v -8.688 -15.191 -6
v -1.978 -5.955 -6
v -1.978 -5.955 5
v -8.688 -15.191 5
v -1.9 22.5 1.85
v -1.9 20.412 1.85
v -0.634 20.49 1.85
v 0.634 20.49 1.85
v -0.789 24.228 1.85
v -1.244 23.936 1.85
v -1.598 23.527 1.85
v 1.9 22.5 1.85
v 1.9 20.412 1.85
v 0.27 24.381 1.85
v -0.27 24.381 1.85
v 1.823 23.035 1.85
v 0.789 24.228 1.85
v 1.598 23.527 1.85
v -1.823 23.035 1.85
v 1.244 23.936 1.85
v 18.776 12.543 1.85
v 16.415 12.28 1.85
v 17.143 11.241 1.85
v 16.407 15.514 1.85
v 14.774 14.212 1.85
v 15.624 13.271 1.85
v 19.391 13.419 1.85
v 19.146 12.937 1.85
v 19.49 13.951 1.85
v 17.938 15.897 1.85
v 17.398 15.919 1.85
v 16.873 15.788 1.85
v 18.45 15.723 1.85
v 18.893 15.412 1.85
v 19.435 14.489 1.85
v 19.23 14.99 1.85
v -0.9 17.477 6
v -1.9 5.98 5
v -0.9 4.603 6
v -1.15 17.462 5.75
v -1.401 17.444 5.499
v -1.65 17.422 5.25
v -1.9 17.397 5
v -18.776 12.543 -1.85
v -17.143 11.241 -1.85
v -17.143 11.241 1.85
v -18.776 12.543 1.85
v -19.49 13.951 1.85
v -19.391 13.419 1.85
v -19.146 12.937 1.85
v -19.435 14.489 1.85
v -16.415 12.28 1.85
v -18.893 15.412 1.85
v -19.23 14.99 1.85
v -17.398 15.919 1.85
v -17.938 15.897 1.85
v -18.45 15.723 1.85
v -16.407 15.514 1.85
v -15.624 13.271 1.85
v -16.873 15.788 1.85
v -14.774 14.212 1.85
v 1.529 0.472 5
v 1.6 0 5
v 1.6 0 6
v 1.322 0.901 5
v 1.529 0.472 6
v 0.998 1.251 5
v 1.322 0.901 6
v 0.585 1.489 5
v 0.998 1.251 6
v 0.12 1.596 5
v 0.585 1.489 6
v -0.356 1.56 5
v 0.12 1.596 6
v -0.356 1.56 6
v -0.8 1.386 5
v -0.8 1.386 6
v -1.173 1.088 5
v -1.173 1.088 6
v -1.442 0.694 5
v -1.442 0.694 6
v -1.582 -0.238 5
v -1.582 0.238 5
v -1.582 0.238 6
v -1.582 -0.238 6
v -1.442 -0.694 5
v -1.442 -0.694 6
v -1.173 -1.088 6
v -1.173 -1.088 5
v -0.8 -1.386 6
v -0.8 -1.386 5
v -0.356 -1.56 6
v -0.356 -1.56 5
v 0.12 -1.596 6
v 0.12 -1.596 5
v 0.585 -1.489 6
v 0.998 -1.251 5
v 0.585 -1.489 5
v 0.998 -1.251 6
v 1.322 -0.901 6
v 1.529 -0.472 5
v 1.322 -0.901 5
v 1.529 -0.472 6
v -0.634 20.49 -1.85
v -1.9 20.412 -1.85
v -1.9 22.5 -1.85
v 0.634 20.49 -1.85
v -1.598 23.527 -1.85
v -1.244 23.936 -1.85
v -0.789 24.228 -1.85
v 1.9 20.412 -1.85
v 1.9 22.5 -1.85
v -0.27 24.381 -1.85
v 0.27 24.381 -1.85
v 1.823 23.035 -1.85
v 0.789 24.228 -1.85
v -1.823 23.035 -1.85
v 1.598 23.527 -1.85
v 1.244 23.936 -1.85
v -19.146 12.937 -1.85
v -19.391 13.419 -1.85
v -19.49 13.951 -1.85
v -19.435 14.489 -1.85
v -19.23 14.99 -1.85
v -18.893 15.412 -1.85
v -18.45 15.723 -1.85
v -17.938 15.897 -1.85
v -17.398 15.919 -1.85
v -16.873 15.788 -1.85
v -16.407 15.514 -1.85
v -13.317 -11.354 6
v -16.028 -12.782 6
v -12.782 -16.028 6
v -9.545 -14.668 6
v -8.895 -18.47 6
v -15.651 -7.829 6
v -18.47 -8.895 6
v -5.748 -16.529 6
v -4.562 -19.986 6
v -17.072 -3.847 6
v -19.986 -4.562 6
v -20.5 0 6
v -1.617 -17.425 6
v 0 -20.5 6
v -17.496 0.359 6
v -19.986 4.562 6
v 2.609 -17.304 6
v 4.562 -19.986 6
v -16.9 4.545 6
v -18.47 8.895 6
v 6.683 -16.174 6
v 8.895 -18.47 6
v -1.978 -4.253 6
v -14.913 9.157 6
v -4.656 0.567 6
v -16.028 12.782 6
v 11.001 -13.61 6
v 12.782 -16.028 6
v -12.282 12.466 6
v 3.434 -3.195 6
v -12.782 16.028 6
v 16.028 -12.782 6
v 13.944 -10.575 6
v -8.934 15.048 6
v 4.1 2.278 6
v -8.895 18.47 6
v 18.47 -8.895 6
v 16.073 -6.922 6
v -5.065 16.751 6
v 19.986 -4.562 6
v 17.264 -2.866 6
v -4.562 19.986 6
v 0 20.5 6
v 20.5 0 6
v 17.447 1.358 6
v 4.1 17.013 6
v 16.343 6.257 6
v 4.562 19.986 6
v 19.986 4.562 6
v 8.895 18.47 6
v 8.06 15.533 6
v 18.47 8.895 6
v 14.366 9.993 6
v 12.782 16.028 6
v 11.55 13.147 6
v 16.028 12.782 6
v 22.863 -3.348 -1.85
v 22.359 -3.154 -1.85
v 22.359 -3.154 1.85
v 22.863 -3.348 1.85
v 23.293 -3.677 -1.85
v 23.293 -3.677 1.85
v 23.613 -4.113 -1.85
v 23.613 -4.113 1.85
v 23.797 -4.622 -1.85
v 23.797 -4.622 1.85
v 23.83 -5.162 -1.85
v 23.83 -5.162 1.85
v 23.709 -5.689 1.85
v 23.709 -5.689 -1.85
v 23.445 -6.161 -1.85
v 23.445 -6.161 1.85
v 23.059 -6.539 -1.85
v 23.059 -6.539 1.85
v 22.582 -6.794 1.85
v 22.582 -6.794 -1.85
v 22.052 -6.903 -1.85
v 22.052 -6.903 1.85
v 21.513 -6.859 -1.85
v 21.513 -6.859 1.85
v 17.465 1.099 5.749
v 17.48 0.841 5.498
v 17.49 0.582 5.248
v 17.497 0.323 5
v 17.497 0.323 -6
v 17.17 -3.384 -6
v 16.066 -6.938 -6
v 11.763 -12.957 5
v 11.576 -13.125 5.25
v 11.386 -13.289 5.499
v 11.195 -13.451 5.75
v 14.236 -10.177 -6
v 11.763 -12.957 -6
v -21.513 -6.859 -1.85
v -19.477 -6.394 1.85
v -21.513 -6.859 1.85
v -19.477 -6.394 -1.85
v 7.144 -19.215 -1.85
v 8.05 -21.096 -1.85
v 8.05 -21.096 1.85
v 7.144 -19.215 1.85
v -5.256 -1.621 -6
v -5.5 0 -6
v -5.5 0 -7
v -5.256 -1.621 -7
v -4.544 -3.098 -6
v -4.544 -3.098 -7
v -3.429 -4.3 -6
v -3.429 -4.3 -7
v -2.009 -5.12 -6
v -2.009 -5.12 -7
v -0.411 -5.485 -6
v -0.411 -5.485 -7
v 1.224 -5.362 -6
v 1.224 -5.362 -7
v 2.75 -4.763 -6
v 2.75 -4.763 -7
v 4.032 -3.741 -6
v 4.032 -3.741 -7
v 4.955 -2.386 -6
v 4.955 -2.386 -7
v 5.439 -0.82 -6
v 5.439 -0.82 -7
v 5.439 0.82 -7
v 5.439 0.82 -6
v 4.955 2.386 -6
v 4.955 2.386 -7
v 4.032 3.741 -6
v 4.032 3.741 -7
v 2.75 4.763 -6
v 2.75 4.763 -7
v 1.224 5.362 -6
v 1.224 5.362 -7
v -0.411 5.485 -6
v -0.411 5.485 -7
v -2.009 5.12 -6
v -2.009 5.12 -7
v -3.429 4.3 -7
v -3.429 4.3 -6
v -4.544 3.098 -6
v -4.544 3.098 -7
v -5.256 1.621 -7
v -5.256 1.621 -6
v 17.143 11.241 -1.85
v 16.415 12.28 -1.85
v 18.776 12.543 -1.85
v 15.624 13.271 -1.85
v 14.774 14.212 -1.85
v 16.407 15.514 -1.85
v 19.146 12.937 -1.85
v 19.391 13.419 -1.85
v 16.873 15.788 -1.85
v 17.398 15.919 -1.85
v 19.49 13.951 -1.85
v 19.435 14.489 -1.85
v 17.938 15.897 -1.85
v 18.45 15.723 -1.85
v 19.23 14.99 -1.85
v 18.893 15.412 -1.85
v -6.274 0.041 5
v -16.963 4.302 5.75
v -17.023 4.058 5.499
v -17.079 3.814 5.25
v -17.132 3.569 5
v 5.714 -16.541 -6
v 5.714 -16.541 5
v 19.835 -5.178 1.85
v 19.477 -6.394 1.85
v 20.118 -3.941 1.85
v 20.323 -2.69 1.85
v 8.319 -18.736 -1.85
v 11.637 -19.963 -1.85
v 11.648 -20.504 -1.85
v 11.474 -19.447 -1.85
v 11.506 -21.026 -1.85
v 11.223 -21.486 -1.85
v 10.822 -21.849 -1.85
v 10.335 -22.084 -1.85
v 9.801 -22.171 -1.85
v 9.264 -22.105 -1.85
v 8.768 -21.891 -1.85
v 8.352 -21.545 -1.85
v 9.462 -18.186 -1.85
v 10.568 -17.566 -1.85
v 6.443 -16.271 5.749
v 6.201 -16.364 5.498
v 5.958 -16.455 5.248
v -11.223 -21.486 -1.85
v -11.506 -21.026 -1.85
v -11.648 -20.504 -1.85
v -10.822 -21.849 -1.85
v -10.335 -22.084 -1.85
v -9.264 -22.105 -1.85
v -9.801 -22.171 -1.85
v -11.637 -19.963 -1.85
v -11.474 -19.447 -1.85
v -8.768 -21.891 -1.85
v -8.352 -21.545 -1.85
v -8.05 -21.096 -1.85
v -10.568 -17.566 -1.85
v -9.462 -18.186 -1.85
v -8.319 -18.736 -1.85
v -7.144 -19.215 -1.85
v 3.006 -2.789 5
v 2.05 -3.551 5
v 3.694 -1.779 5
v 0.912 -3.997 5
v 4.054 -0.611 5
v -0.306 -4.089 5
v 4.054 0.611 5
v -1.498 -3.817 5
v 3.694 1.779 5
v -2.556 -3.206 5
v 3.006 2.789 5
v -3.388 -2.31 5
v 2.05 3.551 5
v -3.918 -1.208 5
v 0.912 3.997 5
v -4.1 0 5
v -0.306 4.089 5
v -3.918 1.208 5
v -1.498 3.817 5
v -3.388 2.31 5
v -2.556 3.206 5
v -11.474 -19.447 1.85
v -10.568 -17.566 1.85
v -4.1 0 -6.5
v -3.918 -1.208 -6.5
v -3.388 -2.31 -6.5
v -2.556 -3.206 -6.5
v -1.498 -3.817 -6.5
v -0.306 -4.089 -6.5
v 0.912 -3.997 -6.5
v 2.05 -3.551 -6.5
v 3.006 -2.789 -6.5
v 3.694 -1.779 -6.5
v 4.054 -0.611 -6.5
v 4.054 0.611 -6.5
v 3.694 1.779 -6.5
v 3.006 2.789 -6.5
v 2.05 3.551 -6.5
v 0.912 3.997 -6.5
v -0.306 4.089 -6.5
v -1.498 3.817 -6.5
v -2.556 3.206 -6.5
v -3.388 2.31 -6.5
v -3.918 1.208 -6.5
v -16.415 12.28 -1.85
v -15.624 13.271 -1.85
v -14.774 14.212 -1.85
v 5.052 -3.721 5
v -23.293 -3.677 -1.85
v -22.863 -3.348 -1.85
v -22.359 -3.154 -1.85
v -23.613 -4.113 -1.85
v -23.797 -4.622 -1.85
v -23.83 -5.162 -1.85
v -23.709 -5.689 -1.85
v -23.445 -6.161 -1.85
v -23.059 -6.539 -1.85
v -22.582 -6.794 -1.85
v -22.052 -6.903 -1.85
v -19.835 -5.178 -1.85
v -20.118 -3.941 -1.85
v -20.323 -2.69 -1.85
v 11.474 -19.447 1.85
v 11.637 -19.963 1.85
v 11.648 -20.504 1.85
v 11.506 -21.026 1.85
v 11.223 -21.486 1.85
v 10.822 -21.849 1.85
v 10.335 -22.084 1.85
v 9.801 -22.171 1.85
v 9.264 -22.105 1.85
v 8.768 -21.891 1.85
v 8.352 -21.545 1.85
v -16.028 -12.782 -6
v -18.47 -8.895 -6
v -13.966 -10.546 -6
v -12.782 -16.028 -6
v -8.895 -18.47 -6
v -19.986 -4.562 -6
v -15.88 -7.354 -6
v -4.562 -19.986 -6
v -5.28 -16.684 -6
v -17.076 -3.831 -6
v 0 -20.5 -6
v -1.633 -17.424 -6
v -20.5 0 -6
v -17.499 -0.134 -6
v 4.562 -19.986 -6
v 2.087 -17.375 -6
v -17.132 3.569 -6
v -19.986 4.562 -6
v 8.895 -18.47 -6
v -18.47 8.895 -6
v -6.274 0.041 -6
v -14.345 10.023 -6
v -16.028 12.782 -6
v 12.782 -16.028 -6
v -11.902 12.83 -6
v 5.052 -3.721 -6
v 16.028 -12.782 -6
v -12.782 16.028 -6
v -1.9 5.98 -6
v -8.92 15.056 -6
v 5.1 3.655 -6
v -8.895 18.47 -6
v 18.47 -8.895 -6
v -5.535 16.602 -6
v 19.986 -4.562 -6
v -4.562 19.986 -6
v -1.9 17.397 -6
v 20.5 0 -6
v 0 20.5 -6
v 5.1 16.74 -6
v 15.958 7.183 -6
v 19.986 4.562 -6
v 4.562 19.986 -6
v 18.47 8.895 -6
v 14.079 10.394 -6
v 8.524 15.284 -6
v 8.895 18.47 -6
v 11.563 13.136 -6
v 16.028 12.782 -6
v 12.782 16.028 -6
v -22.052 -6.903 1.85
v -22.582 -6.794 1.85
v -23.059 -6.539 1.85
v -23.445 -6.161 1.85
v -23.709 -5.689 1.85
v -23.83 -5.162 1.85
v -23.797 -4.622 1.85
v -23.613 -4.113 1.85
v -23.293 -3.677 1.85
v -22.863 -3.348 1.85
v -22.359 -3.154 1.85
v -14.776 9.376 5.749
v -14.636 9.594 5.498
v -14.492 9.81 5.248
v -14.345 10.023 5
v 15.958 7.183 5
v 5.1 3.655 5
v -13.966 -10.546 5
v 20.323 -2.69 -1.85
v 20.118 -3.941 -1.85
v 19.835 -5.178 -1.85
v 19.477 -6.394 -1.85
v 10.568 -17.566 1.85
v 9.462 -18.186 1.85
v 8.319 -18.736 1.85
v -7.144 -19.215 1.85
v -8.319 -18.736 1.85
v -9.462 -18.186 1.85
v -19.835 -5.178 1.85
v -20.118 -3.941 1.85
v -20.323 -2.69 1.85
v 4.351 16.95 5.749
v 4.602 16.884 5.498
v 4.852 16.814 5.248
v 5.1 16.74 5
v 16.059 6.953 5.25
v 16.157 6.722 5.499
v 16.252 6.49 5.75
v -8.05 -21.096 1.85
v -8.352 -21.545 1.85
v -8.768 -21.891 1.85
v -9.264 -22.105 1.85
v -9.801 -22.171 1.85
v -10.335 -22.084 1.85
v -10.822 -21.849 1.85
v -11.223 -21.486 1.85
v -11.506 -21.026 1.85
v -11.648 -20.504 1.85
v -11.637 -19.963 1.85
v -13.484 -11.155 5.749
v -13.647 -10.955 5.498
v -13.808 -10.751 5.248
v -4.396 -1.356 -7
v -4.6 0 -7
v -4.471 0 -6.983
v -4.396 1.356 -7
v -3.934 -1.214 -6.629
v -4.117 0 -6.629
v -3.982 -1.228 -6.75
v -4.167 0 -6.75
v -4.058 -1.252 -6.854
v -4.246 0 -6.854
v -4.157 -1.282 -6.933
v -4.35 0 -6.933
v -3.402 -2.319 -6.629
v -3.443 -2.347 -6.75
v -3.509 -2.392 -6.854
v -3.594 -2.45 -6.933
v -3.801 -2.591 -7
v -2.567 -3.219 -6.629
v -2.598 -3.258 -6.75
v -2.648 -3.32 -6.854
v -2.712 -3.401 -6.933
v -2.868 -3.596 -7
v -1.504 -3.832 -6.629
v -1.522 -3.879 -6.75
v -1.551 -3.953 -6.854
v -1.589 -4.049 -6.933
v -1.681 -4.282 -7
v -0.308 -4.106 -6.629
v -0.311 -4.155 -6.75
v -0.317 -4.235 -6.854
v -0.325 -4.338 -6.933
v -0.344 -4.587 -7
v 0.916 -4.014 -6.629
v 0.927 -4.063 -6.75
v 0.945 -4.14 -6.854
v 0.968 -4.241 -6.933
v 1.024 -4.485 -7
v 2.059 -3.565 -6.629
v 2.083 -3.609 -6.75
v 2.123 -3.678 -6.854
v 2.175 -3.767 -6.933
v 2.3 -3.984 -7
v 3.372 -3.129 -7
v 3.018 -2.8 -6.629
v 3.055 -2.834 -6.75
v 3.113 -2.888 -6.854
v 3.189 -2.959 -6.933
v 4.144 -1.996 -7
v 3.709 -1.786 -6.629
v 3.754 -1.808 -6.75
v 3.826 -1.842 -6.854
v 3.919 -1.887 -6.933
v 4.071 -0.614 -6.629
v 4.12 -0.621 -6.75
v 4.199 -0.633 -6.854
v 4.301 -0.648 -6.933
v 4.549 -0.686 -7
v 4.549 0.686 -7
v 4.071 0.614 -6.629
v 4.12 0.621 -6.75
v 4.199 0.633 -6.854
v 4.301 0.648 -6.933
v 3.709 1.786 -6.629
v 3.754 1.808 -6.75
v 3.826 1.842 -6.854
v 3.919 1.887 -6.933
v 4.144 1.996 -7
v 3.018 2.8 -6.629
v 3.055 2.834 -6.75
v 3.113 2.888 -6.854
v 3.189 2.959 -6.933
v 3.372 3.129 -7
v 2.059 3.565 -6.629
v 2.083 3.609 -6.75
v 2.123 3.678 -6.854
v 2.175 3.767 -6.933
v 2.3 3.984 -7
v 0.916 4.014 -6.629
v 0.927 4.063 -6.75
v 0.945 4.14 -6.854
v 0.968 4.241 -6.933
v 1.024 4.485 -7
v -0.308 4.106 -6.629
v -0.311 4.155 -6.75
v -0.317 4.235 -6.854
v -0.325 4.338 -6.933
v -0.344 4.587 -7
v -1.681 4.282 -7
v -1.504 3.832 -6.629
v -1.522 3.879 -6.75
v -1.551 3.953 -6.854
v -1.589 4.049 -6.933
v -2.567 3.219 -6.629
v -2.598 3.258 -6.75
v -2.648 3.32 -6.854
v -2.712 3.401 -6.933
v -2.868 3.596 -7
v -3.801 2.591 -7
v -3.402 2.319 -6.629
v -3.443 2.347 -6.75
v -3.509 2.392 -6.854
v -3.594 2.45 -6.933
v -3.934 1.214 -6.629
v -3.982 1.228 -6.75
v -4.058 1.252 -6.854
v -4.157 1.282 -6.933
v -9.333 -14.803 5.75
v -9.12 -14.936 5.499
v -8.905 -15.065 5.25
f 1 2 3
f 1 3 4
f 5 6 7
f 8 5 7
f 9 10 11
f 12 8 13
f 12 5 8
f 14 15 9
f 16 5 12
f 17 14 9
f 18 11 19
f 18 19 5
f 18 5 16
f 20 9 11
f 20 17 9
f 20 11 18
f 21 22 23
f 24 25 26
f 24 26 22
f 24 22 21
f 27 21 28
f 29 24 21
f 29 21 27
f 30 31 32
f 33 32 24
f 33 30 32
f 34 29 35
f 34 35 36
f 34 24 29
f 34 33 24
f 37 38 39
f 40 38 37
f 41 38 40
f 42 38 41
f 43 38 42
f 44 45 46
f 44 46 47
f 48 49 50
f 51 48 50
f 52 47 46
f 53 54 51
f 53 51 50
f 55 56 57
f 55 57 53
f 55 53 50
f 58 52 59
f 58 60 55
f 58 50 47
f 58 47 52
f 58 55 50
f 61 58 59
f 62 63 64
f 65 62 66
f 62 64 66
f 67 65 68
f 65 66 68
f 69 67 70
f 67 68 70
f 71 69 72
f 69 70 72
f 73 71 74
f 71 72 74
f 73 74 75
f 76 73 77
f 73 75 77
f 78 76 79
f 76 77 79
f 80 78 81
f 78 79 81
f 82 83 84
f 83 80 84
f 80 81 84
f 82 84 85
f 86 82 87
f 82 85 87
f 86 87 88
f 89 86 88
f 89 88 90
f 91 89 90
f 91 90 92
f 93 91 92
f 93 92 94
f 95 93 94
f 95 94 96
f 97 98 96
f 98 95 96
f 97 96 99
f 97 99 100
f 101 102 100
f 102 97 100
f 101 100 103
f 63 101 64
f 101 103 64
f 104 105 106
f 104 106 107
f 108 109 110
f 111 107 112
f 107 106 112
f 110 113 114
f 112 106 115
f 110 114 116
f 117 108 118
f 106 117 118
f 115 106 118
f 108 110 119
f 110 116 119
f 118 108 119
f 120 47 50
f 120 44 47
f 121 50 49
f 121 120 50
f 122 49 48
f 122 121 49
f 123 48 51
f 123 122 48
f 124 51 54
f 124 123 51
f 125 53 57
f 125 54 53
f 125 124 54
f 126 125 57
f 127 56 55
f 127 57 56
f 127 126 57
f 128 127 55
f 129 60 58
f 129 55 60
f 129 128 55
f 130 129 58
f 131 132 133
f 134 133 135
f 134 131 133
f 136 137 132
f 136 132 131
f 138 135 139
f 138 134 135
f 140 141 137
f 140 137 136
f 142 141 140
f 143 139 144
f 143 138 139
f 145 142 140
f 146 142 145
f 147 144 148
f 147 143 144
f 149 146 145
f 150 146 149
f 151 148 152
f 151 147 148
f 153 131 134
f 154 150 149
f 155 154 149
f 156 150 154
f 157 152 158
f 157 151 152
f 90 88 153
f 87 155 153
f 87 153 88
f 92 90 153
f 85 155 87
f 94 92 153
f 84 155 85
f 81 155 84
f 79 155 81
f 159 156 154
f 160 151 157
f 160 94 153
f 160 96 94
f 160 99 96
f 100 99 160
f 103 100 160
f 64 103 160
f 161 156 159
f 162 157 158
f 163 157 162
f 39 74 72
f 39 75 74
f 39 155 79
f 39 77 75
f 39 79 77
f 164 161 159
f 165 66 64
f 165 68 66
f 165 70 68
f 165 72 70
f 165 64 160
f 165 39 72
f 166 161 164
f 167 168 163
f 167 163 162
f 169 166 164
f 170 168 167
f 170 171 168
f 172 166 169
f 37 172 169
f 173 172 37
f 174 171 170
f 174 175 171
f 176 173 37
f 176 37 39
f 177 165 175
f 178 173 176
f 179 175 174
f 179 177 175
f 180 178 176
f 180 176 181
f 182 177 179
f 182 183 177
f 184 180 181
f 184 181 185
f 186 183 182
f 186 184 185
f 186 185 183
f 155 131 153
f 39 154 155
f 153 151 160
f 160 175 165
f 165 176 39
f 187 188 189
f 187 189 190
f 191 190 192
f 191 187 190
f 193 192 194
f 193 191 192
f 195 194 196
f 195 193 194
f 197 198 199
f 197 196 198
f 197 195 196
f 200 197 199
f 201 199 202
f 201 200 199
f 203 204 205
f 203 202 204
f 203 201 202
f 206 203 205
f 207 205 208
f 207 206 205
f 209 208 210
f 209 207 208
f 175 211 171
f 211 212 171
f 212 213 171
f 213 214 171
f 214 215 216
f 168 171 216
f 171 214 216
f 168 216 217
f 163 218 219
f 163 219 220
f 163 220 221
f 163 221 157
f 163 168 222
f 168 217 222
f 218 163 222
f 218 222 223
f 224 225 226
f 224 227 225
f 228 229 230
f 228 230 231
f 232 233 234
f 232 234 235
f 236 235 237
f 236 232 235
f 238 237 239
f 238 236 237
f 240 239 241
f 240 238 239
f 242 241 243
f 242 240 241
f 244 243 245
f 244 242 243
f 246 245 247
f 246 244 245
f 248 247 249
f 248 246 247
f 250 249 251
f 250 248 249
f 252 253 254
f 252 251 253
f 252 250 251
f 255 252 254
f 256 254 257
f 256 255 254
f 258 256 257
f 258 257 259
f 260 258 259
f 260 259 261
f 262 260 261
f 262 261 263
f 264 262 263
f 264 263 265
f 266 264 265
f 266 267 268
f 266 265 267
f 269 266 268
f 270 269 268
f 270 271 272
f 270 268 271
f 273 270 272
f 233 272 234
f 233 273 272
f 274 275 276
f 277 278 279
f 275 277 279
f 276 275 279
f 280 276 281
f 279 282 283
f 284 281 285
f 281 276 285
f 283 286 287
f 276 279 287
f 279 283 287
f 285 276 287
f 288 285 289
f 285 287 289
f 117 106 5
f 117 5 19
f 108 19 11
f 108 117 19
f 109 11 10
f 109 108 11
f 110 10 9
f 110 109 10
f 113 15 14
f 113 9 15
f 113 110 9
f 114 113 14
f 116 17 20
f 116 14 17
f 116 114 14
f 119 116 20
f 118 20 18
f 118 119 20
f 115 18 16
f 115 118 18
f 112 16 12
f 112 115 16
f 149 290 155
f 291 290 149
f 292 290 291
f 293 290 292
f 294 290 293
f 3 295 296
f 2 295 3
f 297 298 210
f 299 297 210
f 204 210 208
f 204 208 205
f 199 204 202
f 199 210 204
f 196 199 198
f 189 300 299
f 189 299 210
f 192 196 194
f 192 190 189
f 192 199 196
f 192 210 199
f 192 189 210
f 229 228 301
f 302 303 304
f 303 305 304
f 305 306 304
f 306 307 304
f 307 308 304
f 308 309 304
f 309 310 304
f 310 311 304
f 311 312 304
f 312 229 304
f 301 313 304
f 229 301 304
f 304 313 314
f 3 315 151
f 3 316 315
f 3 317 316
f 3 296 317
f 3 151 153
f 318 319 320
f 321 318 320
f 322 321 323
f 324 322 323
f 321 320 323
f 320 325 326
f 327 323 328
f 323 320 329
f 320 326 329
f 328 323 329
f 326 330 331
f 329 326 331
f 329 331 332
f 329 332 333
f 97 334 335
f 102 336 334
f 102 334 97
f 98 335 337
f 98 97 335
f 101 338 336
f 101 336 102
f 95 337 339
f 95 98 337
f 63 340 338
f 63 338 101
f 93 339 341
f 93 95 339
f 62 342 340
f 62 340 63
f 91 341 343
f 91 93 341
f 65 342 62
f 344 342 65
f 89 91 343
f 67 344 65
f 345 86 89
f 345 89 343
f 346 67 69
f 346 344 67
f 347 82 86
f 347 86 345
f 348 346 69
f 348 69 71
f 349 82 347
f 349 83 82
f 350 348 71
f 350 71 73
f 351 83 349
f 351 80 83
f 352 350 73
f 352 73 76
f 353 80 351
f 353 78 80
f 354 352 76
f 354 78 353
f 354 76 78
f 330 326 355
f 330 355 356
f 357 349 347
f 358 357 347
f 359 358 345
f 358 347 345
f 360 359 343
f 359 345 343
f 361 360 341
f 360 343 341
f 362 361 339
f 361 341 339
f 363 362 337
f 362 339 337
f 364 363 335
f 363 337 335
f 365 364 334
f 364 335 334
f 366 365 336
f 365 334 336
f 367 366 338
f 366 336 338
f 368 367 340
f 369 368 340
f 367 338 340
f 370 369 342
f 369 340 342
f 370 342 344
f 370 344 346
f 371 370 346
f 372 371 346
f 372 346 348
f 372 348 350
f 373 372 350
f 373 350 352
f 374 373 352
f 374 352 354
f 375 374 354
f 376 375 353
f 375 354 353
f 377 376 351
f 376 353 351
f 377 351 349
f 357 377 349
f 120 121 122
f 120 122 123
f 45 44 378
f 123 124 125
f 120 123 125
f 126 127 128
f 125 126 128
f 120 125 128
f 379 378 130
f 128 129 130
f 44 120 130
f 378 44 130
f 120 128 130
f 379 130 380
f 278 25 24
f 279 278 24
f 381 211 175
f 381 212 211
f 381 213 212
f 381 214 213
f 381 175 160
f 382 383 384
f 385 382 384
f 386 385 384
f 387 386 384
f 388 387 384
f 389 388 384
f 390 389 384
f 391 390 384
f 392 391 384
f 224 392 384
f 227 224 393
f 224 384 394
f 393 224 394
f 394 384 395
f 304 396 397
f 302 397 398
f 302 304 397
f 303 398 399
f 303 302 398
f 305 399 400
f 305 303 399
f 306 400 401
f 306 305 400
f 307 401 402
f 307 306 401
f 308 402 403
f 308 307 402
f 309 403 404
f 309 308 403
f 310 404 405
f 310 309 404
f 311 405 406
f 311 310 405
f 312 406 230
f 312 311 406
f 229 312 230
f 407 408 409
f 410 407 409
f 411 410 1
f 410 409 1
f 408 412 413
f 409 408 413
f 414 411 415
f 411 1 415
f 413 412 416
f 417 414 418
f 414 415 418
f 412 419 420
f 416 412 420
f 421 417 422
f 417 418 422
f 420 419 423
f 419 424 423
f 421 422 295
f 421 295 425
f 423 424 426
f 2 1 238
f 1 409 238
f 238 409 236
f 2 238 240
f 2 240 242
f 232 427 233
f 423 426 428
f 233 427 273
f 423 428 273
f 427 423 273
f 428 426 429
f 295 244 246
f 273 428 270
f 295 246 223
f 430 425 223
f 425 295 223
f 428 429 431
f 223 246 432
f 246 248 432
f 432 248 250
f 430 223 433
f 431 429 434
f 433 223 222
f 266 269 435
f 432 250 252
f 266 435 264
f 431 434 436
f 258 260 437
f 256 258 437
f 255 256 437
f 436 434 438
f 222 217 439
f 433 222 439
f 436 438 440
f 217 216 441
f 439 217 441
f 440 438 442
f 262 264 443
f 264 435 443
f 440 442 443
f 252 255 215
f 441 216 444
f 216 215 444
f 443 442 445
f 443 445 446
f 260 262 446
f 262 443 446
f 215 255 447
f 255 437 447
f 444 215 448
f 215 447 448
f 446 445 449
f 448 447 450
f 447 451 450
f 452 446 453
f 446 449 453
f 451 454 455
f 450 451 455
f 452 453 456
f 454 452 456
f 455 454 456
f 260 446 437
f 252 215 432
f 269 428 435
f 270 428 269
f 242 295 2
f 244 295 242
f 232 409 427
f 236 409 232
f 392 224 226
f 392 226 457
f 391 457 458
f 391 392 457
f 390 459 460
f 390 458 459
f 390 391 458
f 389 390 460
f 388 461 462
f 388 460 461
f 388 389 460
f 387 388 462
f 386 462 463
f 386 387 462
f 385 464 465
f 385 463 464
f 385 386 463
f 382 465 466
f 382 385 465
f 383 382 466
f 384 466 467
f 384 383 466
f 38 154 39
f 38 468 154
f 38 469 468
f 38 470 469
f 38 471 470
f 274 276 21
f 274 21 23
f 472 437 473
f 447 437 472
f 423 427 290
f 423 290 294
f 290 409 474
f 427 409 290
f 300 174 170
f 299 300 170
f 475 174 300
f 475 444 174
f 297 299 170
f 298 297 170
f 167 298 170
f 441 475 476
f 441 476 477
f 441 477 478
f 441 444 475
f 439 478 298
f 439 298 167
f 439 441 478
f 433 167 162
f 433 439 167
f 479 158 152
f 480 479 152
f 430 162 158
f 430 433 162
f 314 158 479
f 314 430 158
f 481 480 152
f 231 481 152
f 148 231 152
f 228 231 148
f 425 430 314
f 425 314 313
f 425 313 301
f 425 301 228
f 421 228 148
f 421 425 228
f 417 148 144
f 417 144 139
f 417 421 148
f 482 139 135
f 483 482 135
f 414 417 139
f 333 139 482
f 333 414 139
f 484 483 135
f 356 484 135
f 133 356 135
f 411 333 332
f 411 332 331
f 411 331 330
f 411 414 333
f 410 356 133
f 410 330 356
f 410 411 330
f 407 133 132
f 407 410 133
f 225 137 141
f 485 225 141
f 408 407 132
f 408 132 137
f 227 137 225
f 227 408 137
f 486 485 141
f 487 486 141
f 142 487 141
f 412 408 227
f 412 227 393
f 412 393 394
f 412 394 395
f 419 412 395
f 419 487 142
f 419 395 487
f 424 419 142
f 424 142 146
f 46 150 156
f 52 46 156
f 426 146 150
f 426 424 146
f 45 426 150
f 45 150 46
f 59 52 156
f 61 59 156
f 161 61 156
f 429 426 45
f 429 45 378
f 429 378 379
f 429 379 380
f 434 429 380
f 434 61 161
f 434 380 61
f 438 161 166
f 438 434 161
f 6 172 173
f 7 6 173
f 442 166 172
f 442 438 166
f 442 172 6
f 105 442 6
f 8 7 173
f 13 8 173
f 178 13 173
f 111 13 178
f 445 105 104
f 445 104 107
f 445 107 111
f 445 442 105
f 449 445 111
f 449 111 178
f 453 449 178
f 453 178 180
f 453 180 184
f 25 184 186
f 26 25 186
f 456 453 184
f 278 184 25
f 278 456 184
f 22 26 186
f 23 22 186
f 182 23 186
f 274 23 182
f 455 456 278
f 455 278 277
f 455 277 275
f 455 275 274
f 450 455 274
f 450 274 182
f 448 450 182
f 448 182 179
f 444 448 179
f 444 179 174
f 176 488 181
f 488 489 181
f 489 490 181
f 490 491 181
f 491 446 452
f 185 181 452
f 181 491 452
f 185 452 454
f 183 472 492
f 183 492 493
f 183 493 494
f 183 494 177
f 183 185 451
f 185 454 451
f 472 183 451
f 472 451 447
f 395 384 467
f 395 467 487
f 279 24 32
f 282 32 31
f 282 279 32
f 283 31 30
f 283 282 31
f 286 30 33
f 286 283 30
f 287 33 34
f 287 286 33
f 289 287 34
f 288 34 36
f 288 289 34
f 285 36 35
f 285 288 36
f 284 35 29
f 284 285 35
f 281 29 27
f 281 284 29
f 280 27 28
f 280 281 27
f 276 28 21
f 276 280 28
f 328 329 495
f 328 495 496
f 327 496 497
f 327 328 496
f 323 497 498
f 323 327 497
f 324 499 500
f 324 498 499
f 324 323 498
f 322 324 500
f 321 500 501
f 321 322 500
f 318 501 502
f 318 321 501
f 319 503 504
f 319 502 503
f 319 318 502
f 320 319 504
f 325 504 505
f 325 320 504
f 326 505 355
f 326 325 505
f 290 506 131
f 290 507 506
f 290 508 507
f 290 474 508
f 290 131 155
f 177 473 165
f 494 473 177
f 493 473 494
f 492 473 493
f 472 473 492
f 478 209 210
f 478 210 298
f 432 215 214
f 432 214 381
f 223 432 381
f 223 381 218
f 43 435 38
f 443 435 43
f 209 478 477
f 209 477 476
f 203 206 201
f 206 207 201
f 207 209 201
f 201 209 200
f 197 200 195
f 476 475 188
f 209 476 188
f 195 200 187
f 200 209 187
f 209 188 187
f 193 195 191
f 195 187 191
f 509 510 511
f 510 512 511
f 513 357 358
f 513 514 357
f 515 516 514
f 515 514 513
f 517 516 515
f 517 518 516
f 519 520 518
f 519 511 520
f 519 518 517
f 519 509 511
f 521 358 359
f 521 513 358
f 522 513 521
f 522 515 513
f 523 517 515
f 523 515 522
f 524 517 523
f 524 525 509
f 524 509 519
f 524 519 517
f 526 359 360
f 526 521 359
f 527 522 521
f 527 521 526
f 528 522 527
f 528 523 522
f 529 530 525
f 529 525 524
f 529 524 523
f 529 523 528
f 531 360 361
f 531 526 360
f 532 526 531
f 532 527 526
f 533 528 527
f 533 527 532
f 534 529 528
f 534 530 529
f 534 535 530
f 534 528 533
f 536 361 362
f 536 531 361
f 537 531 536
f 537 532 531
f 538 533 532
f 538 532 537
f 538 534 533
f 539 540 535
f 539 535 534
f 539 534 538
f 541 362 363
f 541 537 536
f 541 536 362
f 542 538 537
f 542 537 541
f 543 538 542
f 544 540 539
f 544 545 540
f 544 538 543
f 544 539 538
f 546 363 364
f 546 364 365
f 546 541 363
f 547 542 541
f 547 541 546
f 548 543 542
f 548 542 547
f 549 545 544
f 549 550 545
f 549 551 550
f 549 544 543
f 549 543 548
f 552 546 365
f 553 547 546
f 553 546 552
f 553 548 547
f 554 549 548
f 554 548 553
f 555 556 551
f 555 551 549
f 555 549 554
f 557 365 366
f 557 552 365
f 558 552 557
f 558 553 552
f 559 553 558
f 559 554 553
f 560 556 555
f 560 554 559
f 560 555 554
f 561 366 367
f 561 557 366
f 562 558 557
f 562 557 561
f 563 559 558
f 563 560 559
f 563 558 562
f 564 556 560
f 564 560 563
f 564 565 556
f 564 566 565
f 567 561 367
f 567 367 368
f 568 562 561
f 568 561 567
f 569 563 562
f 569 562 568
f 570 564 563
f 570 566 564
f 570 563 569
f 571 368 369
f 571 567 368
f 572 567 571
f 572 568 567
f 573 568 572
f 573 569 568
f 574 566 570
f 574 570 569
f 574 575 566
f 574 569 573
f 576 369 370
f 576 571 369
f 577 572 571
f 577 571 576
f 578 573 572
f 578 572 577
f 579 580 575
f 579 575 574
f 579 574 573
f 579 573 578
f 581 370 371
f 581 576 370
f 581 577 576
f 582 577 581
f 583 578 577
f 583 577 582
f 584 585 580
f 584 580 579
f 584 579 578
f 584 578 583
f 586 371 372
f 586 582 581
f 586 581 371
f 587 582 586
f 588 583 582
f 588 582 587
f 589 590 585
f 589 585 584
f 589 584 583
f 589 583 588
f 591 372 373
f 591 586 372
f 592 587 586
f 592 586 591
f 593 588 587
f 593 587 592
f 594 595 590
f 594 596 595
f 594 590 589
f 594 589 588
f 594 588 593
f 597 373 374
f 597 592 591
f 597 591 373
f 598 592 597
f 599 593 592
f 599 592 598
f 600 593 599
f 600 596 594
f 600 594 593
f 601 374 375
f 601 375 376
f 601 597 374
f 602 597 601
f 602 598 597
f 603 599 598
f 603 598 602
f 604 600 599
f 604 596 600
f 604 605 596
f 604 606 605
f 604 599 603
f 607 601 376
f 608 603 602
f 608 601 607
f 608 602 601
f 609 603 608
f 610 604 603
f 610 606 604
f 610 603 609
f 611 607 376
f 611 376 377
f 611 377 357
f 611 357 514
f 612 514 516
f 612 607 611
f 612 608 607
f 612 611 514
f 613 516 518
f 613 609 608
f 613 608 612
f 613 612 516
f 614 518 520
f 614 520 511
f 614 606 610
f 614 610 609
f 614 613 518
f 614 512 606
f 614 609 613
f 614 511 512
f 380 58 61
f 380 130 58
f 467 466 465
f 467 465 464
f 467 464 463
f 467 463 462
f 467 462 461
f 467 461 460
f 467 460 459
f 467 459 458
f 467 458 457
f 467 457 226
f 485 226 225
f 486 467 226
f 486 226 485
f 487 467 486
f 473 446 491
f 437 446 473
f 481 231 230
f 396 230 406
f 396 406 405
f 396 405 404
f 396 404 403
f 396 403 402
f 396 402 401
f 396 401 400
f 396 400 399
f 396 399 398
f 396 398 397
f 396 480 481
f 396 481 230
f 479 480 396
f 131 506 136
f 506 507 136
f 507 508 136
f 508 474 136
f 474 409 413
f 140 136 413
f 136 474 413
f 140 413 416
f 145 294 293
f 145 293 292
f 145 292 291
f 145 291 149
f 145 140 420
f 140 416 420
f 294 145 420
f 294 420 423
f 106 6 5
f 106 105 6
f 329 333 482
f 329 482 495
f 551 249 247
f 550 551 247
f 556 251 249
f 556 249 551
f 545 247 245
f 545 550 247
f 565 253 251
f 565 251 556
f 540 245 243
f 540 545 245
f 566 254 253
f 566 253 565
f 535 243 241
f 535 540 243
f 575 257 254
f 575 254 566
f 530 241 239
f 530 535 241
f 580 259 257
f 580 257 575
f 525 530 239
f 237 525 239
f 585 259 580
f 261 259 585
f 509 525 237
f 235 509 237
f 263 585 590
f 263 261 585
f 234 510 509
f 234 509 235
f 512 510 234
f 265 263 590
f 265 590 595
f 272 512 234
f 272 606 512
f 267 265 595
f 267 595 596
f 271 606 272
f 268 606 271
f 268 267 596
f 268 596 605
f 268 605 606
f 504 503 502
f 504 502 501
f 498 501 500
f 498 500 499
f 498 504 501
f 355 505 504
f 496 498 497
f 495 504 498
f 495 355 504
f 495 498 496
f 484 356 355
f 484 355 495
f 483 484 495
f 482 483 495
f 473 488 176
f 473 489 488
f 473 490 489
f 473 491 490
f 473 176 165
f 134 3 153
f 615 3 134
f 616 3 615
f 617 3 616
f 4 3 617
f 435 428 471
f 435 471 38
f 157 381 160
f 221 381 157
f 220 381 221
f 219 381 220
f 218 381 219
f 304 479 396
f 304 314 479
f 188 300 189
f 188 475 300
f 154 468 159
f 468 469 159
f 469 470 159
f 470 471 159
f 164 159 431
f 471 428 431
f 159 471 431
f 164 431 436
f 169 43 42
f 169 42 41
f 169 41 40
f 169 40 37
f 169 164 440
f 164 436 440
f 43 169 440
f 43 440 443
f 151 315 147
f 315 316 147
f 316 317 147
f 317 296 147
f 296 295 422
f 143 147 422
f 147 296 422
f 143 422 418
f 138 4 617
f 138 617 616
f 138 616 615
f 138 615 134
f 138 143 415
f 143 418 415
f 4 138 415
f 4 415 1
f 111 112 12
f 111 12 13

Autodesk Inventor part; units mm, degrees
ref_plane "YZ Plane" through (0, 0, 0) normal (1, 0, 0) x (0, 1, 0)
ref_plane "XZ Plane" through (0, 0, 0) normal (0, 1, 0) x (-1, 0, 0)
ref_plane "XY Plane" through (0, 0, 0) normal (0, 0, 1) x (1, 0, 0)
sketch "Sketch1" plane through (0, 0, 0) normal (0, 0, 1) x (1, 0, 0)
  circle A0 centre (0, 0) radius 20.5
  circle A1 centre (0, 0) radius 17.5
  line L0 (-1.9, 17.5) -> (1.9, 17.5)
  line L1 (-1.9, 17.5) -> (-1.9, 22.5)
  line L2 (-1.9, 22.5) -> (1.9, 22.5)
  line L3 (1.9, 22.5) -> (1.9, 17.5)
  circle A2 centre (0, 22.5) radius 1.9
  circle A3 centre (-17.5912, 14.0285) radius 1.9
  line L4 (-16.4066, 15.514) -> (-12.4974, 12.3966)
  line L5 (-18.7758, 12.543) -> (-16.4066, 15.514)
  line L6 (-14.8667, 9.4256) -> (-18.7758, 12.543)
  line L7 (-14.8667, 9.4256) -> (-12.4974, 12.3966)
  circle A4 centre (-21.9359, -5.0067) radius 1.9
  line L8 (-22.3587, -3.1544) -> (-17.484, -2.0418)
  line L9 (-21.5131, -6.8591) -> (-22.3587, -3.1544)
  line L10 (-16.6384, -5.7465) -> (-21.5131, -6.8591)
  line L11 (-16.6384, -5.7465) -> (-17.484, -2.0418)
  circle A5 centre (-9.7624, -20.2718) radius 1.9
  line L12 (-11.4742, -19.4474) -> (-9.3048, -14.9426)
  line L13 (-8.0505, -21.0962) -> (-11.4742, -19.4474)
  line L14 (-5.8811, -16.5913) -> (-8.0505, -21.0962)
  line L15 (-5.8811, -16.5913) -> (-9.3048, -14.9426)
  circle A6 centre (9.7624, -20.2718) radius 1.9
  line L16 (8.0505, -21.0962) -> (5.8811, -16.5913)
  line L17 (11.4742, -19.4474) -> (8.0505, -21.0962)
  line L18 (9.3048, -14.9426) -> (11.4742, -19.4474)
  line L19 (9.3048, -14.9426) -> (5.8811, -16.5913)
  circle A7 centre (21.9359, -5.0067) radius 1.9
  line L20 (21.5131, -6.8591) -> (16.6384, -5.7465)
  line L21 (22.3587, -3.1544) -> (21.5131, -6.8591)
  line L22 (17.484, -2.0418) -> (22.3587, -3.1544)
  line L23 (17.484, -2.0418) -> (16.6384, -5.7465)
  circle A8 centre (17.5912, 14.0285) radius 1.9
  line L24 (18.7758, 12.543) -> (14.8667, 9.4256)
  line L25 (16.4066, 15.514) -> (18.7758, 12.543)
  line L26 (12.4974, 12.3966) -> (16.4066, 15.514)
  line L27 (12.4974, 12.3966) -> (14.8667, 9.4256)
  line L28 (-1.9, 17.5) -> (5.1, 17.5)
  line L29 (5.1, 17.5) -> (5.1, 0)
  line L30 (5.1, 0) -> (-1.9, 0)
  line L31 (-1.9, 0) -> (-1.9, 17.5)
  line L32 (-0.5871, -1.807) -> (-17.2306, 3.6008)
  line L33 (-17.2306, 3.6008) -> (-15.0675, 10.2582)
  line L34 (-15.0675, 10.2582) -> (1.576, 4.8504)
  line L35 (1.576, 4.8504) -> (-0.5871, -1.807)
  line L36 (1.5371, -1.1168) -> (-8.7491, -15.2746)
  line L37 (-8.7491, -15.2746) -> (-14.4122, -11.1601)
  line L38 (-14.4122, -11.1601) -> (-4.126, 2.9977)
  line L39 (-4.126, 2.9977) -> (1.5371, -1.1168)
  line L40 (1.5371, 1.1168) -> (11.8234, -13.041)
  line L41 (11.8234, -13.041) -> (6.1603, -17.1555)
  line L42 (6.1603, -17.1555) -> (-4.126, -2.9977)
  line L43 (-4.126, -2.9977) -> (1.5371, 1.1168)
  line L44 (-0.5871, 1.807) -> (16.0564, 7.2148)
  line L45 (16.0564, 7.2148) -> (18.2195, 0.5574)
  line L46 (18.2195, 0.5574) -> (1.576, -4.8504)
  line L47 (1.576, -4.8504) -> (-0.5871, 1.807)
  point P0 (-17.1432, 11.241)
  point P1 (-20.3228, -2.6897)
  point P2 (-21.5131, -6.8591)
  point P3 (-19.4772, -6.3944)
  point P4 (-10.5682, -17.566)
  point P5 (-7.1445, -19.2147)
  point P6 (7.1445, -19.2147)
  point P7 (10.5682, -17.566)
  point P8 (19.4772, -6.3944)
  point P9 (22.3587, -3.1544)
  point P10 (20.3228, -2.6897)
  point P11 (17.1432, 11.241)
  point P12 (16.4066, 15.514)
  point P13 (14.7739, 14.212)
  point P14 (1.9, 20.4118)
  point P15 (-1.9, 20.4118)
  point P16 (-14.7739, 14.212)
  point P17 (-17.1322, 3.5688)
  point P18 (-6.2743, 0.0409)
  point P19 (-13.9657, -10.5455)
  point P20 (11.7626, -12.9573)
  point P21 (5.052, -3.721)
  point P22 (17.497, 0.3227)
  point P23 (15.958, 7.1828)
  point P24 (5.1, 3.6549)
  point P25 (5.1, 16.7404)
  point P26 (-8.6883, -15.1909)
  point P27 (-1.9777, -5.9546)
  point P28 (5.7138, -16.5409)
  point P29 (-1.9, 17.3966)
  point P30 (-1.9, 5.9798)
  point P31 (-14.3451, 10.0234)
  point P32 (16.4066, 15.514)
  point P33 (22.3587, -3.1544)
  point P34 (11.4742, -19.4474)
  point P35 (-21.5131, -6.8591)
  dimension "d0" = 35
  dimension "d1" = 41
  dimension "d2" = 3.8
  dimension "d4" = 1.9
  dimension "d5" = 17.5
  dimension "d6" = 5
  dimension "d7" = 3.8
  dimension "d11" = 360
  dimension "d13" = 7
  dimension "d14" = 17.5
  dimension "d17" = 360
extrude "Extrusion1" add sketch "Sketch1" along normal mid plane 12 contours A0 L22 L23 A1 L46 L45 L44 L27 L24 | L24 L27 L26 A0 | A0 L20 L23 L22 | L26 L27 A1 L29 L28 L3 A0 | A0 L18 L19 L41 L40 A1 L23 L20 | L3 L0 L1 A0 | A0 L16 L42 L41 L19 L18 | L1 L31 A1 L7 L4 A0 | L28 L29 A1 L0 | L44 L45 A1 | A1 L46 L40 L30 L29 L44 | L29 L44 L35 L34 L31 A1 | A0 L14 L15 A1 L42 L16 | L40 L41 A1 | A1 L42 L36 L47 L46 L40 | L4 L7 L34 L33 L6 A0 | L0 A1 L31 | L45 L46 A1 | L29 L30 L40 L43 L35 L44 | A0 L12 L15 L37 L36 L14 | L42 A1 L19 L16 | L16 L19 L41 L42 | L19 A1 L41 | L46 L47 L36 L39 L30 L40 | L6 L33 L32 A1 L11 L8 A0 | L44 L47 L39 L31 L34 L35 | L35 L47 L44 | A0 L10 L11 A1 L38 L37 L15 L12 | L30 L43 L40 | L8 L11 L10 A0 | L33 L34 L7 L6 | L6 L7 L34 A1 L33 | A1 L34 L7 | L31 L39 L38 L32 A1 L34 | L43 L32 L38 L39 L31 L30 | L47 L36 L42 L43 L32 L35 | L30 L31 L39 | L35 L32 L43 | L39 L36 L47 | L15 L36 A1 | L36 A1 L38 L32 L43 L42 | A1 L32 L33 | L37 A1 L36 L15 | L15 L36 L37 | L37 L38 A1
extrude "Extrusion2" add sketch "Sketch1" along normal mid plane 3.7 contours A0 L22 L23 A1 L46 L45 L44 L27 L24 | L24 L27 L26 A0 | A0 L26 A8 L24 | L22 A7 L20 A0 | A0 L20 L23 L22 | L26 L27 A1 L29 L28 L3 A0 | L25 A8 | A8 L25 | A0 L18 L19 L41 L40 A1 L23 L20 | L21 A7 | A7 L21 | L3 L0 L1 A0 | A0 L1 A2 L3 | L18 A6 L16 A0 | A0 L16 L42 L41 L19 L18 | L1 L31 A1 L7 L4 A0 | A2 L2 | L2 A2 | L28 L29 A1 L0 | L44 L45 A1 | A1 L46 L40 L30 L29 L44 | L29 L44 L35 L34 L31 A1 | A0 L14 L15 A1 L42 L16 | L17 A6 | A6 L17 | L40 L41 A1 | A1 L42 L36 L47 L46 L40 | L4 L7 L34 L33 L6 A0 | A0 L6 A3 L4 | L0 A1 L31 | L45 L46 A1 | L29 L30 L40 L43 L35 L44 | L14 A5 L12 A0 | A0 L12 L15 L37 L36 L14 | L42 A1 L19 L16 | L16 L19 L41 L42 | L19 A1 L41 | L46 L47 L36 L39 L30 L40 | L6 L33 L32 A1 L11 L8 A0 | L5 A3 | A3 L5 | L44 L47 L39 L31 L34 L35 | L35 L47 L44 | A0 L10 L11 A1 L38 L37 L15 L12 | L13 A5 | A5 L13 | L30 L43 L40 | L8 L11 L10 A0 | A0 L10 A4 L8 | L33 L34 L7 L6 | L6 L7 L34 A1 L33 | A1 L34 L7 | L31 L39 L38 L32 A1 L34 | L43 L32 L38 L39 L31 L30 | L47 L36 L42 L43 L32 L35 | L30 L31 L39 | L35 L32 L43 | L39 L36 L47 | L15 L36 A1 | L36 A1 L38 L32 L43 L42 | L9 A4 | A4 L9 | A1 L32 L33 | L37 A1 L36 L15 | L15 L36 L37 | L37 L38 A1
sketch "Sketch2" plane through (0, 0, -6) normal (0, 0, -1) x (-1, 0, 0)
  circle A0 centre (0, 0) radius 1.6
  circle A1 centre (0, 0) radius 5.5
  circle A2 centre (0, 0) radius 4.1
  dimension "d23" = 3.2
  dimension "d24" = 11
  dimension "d59" = 8.2
extrude "Extrusion3" add sketch "Sketch2" along normal blind 1 contours A0 | A1 | A2
chamfer "Chamfer1" distance 1 angle 45 10 edges at (11.2745, -1.6992, 6) (10.529, 5.4189, 6) (5.1, 10.1976, 6) (-1.9, 11.6882, 6) (-8.1225, 8.0016, 6) (-11.7033, 1.8048, 6) (-10.12, -5.2523, 6) (-5.333, -10.5727, 6) (1.868, -11.2478, 6) (8.4073, -8.3391, 6)
sketch "Sketch4" plane through (0, 0, 6) normal (0, 0, 1) x (1, 0, 0)
  circle A0 centre (0, 0) radius 1.6
  dimension "d60" = 3.2
extrude "Extrusion8" cut sketch "Sketch2" along normal blind 10 and the other way blind 11 contours A2
extrude "Extrusion9" cut sketch "Sketch4" against normal up to surface (13 mm away)
fillet "Fillet2" radius 0.5 1 edges at (4.1, 0, -7)
properties part number "wheel_big"
